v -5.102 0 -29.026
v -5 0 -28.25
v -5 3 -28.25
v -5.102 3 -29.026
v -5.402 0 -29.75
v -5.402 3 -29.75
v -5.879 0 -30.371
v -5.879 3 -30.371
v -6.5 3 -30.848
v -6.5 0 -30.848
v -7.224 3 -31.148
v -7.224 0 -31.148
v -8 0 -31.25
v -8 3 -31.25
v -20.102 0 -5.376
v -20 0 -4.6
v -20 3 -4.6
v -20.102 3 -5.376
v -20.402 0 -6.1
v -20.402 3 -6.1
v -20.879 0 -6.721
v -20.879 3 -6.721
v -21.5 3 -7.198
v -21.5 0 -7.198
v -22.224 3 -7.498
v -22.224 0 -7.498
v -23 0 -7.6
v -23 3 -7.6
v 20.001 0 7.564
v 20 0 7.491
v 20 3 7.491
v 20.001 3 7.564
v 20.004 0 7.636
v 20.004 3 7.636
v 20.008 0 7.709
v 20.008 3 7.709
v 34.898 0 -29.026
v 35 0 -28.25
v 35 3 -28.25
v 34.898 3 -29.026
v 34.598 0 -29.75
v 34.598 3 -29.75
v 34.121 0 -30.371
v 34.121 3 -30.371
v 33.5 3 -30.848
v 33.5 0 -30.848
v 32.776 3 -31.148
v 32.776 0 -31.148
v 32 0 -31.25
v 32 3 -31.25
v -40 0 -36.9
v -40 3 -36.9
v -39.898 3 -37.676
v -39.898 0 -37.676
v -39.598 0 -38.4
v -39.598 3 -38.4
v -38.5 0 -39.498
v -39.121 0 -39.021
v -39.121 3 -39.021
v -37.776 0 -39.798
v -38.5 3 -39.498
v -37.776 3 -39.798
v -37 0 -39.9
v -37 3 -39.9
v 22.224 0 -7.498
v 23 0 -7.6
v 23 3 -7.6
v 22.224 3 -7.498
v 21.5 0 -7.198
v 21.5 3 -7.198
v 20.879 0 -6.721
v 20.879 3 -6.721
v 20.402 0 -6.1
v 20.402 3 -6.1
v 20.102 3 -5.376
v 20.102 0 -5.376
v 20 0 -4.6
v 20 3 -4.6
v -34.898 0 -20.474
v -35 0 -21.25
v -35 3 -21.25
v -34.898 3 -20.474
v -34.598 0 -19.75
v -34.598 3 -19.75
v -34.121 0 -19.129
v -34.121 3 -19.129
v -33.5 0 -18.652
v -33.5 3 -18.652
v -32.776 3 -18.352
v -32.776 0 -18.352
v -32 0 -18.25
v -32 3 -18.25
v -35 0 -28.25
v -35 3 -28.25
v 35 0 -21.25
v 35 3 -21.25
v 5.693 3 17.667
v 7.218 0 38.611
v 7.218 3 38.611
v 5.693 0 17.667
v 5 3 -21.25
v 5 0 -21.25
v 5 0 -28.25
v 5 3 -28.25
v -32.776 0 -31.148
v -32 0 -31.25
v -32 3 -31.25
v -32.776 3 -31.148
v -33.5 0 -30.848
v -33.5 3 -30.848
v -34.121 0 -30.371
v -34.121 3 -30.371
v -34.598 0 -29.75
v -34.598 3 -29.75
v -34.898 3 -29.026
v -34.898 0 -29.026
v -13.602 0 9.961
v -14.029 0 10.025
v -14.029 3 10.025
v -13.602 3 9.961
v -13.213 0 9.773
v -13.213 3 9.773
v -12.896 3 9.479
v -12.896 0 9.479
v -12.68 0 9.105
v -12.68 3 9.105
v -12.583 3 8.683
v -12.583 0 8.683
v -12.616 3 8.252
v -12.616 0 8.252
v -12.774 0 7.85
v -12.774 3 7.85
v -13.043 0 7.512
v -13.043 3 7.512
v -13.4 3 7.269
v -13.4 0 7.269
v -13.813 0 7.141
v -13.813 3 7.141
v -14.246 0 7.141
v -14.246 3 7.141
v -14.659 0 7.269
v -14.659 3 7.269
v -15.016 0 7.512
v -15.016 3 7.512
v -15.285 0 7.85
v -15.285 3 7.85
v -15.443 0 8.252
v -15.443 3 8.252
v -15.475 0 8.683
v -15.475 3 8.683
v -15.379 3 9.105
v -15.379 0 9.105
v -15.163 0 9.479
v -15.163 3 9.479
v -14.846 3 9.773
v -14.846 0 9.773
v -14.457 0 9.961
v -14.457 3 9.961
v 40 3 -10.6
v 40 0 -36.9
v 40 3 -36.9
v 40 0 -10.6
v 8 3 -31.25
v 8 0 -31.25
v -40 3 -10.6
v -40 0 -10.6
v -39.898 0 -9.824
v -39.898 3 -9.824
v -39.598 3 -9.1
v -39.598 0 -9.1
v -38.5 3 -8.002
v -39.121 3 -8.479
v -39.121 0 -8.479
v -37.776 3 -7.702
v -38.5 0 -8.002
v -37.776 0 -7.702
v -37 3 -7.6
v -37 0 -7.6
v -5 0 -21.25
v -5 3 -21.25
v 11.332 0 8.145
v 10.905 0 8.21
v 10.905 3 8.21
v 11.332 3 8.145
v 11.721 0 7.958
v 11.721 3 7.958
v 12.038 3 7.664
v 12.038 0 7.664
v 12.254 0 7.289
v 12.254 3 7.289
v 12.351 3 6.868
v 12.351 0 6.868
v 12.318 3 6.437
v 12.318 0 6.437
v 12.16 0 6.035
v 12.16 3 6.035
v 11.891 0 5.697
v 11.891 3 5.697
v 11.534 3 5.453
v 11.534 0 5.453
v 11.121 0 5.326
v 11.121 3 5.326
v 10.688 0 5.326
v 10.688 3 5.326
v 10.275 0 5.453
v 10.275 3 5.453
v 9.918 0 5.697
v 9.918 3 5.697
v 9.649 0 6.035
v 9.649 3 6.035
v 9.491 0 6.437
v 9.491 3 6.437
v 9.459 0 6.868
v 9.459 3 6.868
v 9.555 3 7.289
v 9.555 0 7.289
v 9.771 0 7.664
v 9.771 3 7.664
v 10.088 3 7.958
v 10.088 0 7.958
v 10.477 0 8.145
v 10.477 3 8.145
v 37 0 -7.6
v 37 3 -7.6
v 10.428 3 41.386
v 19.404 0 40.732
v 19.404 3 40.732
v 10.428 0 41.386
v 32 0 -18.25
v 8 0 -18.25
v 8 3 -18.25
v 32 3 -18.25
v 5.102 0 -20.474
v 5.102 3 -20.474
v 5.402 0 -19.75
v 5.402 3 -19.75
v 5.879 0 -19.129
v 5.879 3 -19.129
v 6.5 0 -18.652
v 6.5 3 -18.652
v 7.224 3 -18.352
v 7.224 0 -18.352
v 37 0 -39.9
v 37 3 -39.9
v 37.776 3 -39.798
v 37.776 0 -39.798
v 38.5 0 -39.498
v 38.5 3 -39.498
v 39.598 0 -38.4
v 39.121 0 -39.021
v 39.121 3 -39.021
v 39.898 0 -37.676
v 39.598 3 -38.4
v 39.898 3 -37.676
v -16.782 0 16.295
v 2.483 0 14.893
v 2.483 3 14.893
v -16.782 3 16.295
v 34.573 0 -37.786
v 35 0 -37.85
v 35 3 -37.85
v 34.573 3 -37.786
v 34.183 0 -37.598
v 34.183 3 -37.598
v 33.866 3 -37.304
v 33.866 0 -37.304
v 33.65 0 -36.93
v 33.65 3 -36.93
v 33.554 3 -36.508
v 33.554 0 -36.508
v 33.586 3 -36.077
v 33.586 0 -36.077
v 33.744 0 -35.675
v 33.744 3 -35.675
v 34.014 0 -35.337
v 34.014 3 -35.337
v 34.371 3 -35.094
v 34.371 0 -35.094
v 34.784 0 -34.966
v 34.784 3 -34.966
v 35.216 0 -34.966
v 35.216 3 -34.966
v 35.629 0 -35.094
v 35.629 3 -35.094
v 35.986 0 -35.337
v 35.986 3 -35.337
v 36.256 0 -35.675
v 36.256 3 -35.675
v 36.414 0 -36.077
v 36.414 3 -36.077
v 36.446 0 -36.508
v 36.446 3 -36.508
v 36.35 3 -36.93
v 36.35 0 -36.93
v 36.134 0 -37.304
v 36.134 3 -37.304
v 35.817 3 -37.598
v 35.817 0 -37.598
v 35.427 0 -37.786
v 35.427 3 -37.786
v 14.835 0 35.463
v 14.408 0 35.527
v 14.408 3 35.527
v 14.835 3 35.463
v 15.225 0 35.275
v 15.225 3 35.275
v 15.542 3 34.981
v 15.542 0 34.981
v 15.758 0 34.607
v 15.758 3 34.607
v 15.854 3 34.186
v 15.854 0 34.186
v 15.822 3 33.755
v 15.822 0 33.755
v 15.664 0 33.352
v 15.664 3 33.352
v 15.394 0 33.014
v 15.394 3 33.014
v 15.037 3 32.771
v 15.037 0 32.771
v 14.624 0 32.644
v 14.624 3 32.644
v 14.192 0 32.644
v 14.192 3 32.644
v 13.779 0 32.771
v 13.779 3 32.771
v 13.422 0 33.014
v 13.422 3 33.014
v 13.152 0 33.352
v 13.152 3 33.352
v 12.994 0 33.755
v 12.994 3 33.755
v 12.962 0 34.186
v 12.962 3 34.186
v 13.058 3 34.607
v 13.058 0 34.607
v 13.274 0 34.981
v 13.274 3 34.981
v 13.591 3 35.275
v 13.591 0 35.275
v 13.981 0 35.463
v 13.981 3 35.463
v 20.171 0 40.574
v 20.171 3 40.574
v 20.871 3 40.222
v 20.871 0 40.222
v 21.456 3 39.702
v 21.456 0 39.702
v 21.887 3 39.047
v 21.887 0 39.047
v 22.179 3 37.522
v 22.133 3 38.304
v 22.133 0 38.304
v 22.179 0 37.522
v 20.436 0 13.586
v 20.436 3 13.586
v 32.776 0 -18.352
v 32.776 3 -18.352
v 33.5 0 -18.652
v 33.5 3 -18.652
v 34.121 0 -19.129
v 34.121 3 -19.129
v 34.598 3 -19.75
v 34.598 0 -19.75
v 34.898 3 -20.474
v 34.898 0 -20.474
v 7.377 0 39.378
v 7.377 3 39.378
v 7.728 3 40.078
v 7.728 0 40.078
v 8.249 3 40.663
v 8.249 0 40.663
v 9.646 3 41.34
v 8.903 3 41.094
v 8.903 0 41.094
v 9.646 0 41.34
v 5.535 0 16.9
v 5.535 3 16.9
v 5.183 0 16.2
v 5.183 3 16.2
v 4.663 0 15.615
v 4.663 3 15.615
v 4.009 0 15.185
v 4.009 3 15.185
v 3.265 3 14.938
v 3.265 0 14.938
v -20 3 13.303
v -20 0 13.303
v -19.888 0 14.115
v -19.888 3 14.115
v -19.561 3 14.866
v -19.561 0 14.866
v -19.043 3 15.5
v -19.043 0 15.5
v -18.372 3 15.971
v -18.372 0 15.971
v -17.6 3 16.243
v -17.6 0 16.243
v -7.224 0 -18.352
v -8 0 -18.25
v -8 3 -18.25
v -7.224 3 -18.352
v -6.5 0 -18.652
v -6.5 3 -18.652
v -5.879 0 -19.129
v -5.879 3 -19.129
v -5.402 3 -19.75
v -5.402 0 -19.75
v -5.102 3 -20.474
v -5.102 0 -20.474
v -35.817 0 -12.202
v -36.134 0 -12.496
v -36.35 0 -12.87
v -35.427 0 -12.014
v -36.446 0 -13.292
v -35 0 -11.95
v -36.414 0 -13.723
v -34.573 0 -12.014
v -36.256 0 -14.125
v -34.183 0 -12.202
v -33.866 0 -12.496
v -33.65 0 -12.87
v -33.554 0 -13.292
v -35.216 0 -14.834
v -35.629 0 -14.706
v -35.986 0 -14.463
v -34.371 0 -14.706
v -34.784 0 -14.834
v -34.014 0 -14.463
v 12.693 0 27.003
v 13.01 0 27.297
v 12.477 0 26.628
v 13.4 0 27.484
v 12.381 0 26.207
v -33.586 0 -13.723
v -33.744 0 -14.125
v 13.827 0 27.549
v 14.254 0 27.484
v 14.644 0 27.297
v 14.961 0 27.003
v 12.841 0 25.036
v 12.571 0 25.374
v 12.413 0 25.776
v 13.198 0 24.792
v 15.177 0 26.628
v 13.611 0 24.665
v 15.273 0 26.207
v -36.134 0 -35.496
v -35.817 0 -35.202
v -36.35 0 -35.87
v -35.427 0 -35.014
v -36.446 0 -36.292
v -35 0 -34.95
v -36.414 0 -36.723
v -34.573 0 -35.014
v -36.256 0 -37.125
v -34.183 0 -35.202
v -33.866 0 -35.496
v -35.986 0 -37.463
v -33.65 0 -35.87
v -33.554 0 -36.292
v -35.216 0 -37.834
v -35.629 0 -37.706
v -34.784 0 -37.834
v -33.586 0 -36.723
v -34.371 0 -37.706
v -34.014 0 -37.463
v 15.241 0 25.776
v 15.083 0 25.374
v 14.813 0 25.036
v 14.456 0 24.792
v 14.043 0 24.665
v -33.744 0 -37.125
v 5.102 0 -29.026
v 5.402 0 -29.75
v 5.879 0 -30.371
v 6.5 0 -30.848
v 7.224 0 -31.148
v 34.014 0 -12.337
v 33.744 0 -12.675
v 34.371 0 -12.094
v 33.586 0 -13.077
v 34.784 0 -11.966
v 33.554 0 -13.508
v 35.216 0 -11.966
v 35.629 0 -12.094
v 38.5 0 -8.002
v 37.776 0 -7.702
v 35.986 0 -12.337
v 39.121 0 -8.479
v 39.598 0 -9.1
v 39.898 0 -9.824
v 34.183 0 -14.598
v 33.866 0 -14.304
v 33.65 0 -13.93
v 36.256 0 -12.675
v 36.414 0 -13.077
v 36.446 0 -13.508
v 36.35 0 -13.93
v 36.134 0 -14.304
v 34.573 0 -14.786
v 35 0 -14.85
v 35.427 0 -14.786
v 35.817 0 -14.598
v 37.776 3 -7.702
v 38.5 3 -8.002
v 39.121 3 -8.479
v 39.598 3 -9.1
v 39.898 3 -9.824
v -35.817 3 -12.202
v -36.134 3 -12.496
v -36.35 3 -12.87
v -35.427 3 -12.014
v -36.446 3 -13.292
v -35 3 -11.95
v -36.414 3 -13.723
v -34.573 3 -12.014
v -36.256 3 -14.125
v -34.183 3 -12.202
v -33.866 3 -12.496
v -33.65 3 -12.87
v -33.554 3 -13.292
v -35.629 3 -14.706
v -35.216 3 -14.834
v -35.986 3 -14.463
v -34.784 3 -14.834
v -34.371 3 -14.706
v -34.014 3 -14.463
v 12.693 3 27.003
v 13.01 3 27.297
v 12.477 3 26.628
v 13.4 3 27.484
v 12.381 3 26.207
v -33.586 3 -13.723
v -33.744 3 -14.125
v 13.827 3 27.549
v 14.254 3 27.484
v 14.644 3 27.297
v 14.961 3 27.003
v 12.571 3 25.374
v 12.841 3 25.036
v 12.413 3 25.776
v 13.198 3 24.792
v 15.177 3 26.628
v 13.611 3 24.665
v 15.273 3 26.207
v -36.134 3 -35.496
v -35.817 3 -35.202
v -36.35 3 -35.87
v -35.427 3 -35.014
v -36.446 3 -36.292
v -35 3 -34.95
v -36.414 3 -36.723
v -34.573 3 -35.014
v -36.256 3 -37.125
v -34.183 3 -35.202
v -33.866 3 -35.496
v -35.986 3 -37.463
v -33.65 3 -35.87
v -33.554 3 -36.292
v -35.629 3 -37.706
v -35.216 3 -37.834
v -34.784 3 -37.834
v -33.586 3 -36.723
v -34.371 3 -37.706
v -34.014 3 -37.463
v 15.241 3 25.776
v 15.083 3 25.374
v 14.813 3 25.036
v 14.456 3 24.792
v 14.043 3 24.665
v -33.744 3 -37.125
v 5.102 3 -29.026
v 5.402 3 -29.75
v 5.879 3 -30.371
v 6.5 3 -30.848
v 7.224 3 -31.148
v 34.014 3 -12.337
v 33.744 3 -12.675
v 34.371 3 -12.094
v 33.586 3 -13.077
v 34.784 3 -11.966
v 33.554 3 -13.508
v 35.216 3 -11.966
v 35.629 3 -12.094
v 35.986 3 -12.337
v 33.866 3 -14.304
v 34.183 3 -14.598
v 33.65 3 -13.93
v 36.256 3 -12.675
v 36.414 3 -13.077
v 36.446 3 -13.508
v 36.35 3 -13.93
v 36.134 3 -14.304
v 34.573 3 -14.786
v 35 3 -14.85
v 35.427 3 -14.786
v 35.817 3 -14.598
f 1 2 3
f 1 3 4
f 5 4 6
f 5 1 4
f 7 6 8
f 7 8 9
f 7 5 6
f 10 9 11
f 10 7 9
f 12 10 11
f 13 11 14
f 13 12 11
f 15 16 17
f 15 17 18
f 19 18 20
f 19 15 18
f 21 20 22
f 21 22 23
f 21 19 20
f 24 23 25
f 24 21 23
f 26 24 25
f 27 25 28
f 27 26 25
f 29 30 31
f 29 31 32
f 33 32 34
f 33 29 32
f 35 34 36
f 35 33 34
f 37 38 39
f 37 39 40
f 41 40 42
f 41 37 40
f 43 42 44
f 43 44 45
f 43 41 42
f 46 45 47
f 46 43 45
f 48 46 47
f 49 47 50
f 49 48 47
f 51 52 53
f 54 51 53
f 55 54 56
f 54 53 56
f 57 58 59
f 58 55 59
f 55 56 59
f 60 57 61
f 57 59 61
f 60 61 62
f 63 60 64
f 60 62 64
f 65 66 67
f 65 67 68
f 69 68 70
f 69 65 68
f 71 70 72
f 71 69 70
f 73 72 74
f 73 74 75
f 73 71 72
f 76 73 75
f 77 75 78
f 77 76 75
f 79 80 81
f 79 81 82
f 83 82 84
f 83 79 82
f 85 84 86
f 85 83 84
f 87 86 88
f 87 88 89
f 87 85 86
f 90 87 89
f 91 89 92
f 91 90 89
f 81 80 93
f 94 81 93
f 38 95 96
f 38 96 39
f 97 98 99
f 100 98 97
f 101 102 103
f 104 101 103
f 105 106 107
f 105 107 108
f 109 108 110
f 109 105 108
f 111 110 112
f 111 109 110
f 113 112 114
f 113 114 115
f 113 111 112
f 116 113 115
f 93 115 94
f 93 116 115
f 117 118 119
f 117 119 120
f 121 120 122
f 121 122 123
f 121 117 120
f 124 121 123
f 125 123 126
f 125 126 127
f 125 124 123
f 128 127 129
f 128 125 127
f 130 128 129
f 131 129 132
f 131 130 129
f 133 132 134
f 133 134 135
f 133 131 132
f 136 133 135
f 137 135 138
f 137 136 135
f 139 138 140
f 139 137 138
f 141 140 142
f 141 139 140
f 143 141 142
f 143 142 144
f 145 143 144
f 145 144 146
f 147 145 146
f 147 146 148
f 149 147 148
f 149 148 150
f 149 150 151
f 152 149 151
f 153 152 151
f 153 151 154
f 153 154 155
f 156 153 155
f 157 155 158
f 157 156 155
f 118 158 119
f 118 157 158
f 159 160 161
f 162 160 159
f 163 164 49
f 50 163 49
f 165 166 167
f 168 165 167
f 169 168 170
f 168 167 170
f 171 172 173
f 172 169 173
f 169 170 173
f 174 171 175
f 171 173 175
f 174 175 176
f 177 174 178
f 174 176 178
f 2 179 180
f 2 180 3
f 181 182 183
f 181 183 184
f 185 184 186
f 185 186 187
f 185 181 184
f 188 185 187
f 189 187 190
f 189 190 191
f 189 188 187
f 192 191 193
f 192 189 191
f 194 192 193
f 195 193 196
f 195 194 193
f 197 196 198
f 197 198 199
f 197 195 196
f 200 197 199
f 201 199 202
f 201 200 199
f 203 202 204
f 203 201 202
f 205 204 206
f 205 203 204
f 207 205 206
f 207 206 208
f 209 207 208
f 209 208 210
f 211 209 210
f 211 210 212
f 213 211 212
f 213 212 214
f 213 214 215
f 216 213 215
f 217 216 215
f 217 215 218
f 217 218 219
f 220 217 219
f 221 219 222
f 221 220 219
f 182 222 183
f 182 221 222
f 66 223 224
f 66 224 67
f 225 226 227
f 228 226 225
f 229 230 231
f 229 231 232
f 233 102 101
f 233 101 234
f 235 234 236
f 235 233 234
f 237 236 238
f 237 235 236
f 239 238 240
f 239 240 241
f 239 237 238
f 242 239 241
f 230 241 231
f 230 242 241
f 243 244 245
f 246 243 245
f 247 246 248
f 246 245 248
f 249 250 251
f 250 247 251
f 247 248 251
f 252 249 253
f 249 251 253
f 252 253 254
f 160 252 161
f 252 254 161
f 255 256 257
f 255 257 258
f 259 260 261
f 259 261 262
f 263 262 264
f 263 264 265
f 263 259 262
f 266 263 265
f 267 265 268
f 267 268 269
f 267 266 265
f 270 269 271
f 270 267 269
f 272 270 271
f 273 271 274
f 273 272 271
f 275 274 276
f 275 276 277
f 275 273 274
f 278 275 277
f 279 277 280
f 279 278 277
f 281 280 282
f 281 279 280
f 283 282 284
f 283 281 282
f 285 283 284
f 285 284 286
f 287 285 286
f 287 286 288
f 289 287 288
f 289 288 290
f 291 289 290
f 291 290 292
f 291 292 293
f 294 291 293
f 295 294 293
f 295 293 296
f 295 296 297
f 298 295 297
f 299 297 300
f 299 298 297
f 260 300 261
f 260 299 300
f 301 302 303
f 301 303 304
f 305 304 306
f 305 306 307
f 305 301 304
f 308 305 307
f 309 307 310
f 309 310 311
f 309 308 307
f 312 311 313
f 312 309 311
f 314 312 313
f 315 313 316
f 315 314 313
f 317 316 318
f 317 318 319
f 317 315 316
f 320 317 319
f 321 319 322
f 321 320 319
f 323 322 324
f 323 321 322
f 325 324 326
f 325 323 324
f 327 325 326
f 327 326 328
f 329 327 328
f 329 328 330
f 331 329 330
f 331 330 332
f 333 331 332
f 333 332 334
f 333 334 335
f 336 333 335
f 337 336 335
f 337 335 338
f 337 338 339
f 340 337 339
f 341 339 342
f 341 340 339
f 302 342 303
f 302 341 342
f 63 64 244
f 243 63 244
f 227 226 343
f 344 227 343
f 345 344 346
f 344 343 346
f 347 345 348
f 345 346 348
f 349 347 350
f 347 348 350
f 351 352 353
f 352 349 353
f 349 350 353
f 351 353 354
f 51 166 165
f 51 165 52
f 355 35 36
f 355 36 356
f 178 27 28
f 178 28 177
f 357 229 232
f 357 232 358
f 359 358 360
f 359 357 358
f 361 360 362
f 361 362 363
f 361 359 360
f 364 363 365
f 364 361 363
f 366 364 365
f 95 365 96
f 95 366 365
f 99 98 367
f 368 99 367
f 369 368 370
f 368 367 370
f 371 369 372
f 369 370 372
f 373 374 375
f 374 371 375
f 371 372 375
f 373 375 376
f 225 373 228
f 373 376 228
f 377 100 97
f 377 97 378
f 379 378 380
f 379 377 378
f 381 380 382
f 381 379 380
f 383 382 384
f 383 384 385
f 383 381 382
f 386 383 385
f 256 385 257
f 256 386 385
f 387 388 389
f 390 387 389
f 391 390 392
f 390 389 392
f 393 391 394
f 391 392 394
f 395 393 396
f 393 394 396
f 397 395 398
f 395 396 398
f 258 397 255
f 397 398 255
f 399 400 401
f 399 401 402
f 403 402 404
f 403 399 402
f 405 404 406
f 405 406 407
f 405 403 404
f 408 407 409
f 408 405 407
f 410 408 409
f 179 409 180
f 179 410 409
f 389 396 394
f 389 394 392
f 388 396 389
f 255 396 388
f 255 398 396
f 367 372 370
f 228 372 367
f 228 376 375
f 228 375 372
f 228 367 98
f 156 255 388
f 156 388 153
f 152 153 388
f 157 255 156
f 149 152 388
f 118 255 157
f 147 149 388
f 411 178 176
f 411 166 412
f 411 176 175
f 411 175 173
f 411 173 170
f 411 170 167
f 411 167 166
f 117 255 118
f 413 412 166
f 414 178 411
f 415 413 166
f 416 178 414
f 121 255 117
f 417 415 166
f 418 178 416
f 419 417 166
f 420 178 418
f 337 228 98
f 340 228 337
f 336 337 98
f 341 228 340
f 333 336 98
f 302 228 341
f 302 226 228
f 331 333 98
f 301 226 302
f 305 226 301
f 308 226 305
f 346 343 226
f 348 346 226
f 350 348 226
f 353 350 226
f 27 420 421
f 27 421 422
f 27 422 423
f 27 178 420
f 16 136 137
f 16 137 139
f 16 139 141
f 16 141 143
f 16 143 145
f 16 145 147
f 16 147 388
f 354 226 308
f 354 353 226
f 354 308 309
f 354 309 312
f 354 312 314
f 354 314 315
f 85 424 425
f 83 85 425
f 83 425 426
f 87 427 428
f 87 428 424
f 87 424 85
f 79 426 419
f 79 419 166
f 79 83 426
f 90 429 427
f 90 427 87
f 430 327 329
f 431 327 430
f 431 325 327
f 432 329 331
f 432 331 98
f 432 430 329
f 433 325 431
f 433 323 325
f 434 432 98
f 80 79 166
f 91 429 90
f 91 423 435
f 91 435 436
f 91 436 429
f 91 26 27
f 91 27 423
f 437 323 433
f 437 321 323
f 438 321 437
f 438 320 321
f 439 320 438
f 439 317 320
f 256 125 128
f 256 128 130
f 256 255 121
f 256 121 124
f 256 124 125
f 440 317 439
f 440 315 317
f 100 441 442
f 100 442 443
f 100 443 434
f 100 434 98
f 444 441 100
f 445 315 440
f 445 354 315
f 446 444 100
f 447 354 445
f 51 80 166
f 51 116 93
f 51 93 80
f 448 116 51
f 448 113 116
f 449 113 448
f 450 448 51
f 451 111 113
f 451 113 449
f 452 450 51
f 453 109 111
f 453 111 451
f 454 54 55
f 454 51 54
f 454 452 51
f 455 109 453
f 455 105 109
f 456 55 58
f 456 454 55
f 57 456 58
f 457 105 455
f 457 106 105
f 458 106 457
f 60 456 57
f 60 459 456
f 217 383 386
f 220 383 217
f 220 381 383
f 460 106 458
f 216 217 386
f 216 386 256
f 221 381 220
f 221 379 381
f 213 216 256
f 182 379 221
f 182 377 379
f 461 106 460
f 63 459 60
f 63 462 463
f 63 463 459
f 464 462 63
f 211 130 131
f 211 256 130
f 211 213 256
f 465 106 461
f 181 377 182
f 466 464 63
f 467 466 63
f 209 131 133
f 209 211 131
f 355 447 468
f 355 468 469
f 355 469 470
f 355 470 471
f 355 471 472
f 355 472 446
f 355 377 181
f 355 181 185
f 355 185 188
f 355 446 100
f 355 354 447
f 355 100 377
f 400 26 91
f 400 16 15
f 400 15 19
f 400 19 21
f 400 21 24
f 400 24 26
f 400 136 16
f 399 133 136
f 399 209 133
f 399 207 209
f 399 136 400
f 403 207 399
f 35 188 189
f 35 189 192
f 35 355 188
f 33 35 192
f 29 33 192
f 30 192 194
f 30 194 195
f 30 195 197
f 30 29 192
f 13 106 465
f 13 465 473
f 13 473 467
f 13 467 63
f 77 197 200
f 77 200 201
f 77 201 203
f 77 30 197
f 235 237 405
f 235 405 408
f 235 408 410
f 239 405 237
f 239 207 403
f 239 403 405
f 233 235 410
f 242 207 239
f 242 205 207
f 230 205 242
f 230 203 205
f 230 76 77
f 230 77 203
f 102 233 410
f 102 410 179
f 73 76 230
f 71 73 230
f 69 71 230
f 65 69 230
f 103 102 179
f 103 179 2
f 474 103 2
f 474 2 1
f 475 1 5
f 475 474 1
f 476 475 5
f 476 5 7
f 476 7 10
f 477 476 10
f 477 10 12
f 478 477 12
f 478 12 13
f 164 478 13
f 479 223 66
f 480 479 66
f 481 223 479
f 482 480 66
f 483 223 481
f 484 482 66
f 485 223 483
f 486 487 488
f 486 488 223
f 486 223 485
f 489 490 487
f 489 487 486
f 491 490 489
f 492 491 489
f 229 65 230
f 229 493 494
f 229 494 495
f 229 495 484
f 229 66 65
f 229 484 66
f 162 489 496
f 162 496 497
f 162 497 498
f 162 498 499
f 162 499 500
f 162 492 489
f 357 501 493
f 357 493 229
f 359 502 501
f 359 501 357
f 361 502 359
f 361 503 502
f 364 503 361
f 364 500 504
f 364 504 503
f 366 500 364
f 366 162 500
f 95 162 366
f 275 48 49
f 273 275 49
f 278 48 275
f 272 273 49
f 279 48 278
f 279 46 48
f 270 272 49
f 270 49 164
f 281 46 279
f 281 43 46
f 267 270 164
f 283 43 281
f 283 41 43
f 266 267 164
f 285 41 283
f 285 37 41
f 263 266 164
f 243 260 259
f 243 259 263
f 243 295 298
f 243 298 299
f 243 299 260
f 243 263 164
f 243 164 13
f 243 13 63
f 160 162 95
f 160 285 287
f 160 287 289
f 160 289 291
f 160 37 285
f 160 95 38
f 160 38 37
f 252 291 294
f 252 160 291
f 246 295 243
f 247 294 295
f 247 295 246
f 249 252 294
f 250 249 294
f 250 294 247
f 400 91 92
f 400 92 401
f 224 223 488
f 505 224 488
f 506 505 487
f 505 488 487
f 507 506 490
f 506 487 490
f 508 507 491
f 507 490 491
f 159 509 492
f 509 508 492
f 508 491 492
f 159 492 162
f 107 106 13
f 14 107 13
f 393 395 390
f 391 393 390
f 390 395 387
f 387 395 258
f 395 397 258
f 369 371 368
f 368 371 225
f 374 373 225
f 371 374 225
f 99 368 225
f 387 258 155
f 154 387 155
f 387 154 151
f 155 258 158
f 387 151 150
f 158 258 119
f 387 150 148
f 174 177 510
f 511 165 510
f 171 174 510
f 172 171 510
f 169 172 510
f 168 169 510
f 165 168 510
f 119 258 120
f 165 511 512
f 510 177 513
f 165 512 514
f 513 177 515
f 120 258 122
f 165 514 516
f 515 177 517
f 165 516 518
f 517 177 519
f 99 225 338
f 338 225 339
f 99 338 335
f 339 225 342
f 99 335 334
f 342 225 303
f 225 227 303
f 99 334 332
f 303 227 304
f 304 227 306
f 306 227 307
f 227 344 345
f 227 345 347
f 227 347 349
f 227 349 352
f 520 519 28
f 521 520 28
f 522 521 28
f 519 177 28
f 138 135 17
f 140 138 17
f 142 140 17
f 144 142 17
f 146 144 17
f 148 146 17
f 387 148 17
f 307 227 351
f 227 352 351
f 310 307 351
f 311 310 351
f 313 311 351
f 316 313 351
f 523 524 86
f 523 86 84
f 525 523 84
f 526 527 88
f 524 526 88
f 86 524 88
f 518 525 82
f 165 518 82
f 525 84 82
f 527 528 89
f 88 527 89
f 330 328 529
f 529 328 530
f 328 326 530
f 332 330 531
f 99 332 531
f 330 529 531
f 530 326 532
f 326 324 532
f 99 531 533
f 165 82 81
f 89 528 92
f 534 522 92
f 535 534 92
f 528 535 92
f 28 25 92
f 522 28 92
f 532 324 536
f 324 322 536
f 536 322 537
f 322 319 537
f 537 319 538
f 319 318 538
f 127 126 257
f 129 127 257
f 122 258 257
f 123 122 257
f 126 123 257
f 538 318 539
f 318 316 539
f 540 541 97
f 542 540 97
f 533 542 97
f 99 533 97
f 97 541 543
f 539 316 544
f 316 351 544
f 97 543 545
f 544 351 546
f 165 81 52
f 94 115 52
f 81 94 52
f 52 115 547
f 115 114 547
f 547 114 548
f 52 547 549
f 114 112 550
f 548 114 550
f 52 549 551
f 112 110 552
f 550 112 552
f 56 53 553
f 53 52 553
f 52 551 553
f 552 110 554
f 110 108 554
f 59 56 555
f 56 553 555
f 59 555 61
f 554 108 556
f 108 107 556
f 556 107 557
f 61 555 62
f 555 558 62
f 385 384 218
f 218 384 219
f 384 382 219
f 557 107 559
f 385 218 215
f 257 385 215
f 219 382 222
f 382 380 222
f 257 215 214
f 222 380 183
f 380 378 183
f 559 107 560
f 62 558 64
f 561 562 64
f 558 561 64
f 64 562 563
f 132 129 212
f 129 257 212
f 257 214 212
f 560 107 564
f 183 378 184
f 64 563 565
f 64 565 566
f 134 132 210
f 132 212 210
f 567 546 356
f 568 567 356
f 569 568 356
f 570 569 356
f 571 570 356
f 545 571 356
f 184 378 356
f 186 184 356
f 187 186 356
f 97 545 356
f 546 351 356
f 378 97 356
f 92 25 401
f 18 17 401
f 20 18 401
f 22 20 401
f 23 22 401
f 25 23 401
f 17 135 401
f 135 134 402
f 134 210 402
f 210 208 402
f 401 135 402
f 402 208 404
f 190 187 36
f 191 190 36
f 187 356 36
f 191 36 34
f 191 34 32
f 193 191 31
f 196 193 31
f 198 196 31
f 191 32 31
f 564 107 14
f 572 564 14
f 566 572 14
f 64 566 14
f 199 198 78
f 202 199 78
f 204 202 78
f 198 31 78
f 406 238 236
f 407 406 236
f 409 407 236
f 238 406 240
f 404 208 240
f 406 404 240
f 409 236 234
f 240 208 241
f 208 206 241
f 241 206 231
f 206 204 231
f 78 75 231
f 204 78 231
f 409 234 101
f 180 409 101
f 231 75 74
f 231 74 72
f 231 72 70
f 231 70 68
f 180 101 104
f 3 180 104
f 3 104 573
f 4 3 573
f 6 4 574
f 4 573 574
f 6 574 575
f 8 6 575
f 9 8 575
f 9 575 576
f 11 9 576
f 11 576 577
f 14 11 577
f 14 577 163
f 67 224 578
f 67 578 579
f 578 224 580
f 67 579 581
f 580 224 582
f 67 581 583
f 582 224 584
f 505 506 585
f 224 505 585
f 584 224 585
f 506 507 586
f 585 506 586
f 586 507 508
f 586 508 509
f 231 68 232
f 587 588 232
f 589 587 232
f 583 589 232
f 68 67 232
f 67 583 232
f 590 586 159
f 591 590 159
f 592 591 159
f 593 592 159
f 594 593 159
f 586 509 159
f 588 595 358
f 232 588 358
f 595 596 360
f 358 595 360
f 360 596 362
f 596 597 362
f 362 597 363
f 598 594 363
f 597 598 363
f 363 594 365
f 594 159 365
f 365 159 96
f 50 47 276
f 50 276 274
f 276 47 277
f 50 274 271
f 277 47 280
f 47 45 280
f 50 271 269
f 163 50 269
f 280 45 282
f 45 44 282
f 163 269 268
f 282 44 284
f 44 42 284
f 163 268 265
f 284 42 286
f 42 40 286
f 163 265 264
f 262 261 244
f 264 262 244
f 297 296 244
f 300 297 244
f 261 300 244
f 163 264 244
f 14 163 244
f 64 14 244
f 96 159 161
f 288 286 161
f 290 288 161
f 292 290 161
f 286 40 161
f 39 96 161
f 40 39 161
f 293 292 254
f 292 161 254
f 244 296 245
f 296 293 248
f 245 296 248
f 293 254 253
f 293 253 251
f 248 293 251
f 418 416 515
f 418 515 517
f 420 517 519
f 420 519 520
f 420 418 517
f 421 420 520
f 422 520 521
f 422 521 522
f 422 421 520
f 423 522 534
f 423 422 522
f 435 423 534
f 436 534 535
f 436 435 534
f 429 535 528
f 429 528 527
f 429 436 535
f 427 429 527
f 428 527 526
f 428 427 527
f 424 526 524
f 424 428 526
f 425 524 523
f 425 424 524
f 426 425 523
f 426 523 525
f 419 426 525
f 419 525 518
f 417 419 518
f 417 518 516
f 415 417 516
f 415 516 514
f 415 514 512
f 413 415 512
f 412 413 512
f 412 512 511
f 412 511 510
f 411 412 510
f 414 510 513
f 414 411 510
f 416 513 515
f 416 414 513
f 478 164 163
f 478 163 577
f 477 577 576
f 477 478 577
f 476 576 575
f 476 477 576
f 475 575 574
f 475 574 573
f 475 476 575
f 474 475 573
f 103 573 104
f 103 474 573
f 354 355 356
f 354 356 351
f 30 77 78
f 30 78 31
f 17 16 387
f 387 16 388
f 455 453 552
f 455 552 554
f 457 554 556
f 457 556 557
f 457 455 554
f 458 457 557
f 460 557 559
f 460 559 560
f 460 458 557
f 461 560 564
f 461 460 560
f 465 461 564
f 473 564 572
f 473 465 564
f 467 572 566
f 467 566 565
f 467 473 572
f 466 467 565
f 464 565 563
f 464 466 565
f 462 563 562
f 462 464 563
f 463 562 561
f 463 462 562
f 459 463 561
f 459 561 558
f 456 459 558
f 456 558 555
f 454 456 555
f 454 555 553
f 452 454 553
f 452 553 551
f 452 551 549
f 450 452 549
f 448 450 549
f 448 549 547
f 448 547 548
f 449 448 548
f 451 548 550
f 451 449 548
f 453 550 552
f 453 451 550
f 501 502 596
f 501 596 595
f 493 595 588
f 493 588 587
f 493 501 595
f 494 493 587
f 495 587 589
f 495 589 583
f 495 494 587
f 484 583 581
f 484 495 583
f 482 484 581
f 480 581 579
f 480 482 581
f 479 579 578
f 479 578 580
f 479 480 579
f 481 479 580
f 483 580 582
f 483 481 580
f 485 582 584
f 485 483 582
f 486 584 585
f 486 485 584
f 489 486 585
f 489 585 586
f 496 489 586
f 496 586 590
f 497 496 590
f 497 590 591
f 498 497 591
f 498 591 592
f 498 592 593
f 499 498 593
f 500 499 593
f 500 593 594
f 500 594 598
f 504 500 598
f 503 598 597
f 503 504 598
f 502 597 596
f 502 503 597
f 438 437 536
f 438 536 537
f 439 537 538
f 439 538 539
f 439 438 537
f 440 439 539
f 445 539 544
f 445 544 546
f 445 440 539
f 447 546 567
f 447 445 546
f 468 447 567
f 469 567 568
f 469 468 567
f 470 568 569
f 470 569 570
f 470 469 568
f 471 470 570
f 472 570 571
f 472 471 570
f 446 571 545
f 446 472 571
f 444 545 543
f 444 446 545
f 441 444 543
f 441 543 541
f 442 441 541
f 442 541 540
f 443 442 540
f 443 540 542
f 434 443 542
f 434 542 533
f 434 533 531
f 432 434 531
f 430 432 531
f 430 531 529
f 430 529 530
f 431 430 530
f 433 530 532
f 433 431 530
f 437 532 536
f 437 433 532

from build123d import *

# Parameters (mm, degrees)
SKETCH_1_R          = 1.45
SKETCH_1_W          = 30
SKETCH_1_H          = 13
EXTRUDE_1_DEPTH     = 3
SKETCH_2_W          = 80
SKETCH_2_H          = 2
CUT_EXTRUDE_1_DEPTH = 59.005258382
FILLET_1_R          = 3


with BuildPart() as part:
    # 草图1 → 凸台-拉伸1 (new body)
    with BuildSketch(Plane(origin=(0, 0, 0), x_dir=(1, 0, 0), z_dir=(0, 1, 0))):
        Polygon((-20, -7.6), (-20, 7.6), (-40, 7.6), (-40, 41.9), (40, 41.9), (40, 7.6), (20, 7.6), (20, -7.6), (20.435801373, -13.585557258), (22.396449617, -40.514275357), (7.436050673, -41.603524381), (5.475402429, -14.674806282), (-20, -16.529640324), align=None)
        with Locations(Location((-35, 13.4, 0), (0, 0, 270))):
            Circle(SKETCH_1_R, mode=Mode.SUBTRACT)
        with Locations(Location((-35, 36.4, 0), (0, 0, 270))):
            Circle(SKETCH_1_R, mode=Mode.SUBTRACT)
        with Locations(Location((35, 13.4, 0), (0, 0, 90))):
            Circle(SKETCH_1_R, mode=Mode.SUBTRACT)
        with Locations(Location((35, 36.4, 0), (0, 0, 90))):
            Circle(SKETCH_1_R, mode=Mode.SUBTRACT)
        with Locations(Location((-14.029429392, -8.57507717, 0), (0, 0, 270))):
            Circle(SKETCH_1_R, mode=Mode.SUBTRACT)
        with Locations(Location((10.904568848, -6.759662129, 0), (0, 0, 270))):
            Circle(SKETCH_1_R, mode=Mode.SUBTRACT)
        with Locations(Location((13.827001121, -26.098500925, 0), (0, 0, 270))):
            Circle(SKETCH_1_R, mode=Mode.SUBTRACT)
        with Locations(Location((14.407933934, -34.077380362, 0), (0, 0, 270))):
            Circle(SKETCH_1_R, mode=Mode.SUBTRACT)
        with Locations((-20, 24.75)):
            Rectangle(SKETCH_1_W, SKETCH_1_H, mode=Mode.SUBTRACT)
        with Locations((20, 24.75)):
            Rectangle(SKETCH_1_W, SKETCH_1_H, mode=Mode.SUBTRACT)
    extrude(amount=EXTRUDE_1_DEPTH)

    # 草图2 → 切除-拉伸1 (cut, through all)
    with BuildSketch(Plane(origin=(0, 3, 0), x_dir=(1, 0, 0), z_dir=(0, 1, 0))):
        with Locations((0, 40.9)):
            Rectangle(SKETCH_2_W, SKETCH_2_H)
    extrude(amount=-CUT_EXTRUDE_1_DEPTH, mode=Mode.SUBTRACT)

    # 圆角1
    # the kernel refuses this fillet: 3 mm, written as the material it adds along each edge
    with BuildSketch(Plane(origin=(20, 0, -7.6), x_dir=(0, 0, 1), z_dir=(0, 1, 0)), Plane(origin=(5.475402429, 0, 14.674806282), x_dir=(-0.9973599295981227, 0, 0.07261660162819321), z_dir=(0, 1, 0)), Plane(origin=(-35, 0, -31.25), x_dir=(0, 0, 1), z_dir=(0, 1, 0)), Plane(origin=(-35, 0, -18.25), x_dir=(1, 0, 0), z_dir=(0, 1, 0)), Plane(origin=(5, 0, -18.25), x_dir=(1, 0, 0), z_dir=(0, 1, 0)), Plane(origin=(5, 0, -31.25), x_dir=(0, 0, 1), z_dir=(0, 1, 0))) as fillet_1_piece_1:
        with BuildLine():
            CenterArc((FILLET_1_R, FILLET_1_R), FILLET_1_R, 180, 90)
            Line((0, FILLET_1_R), (0, 0))
            Line((0, 0), (FILLET_1_R, 0))
        make_face()
    extrude(amount=3)
    with BuildSketch(Plane(origin=(20, 0, 7.6), x_dir=(0.07261660162820198, 0, 0.9973599295981221), z_dir=(0, 1, 0))) as fillet_1_piece_2:
        with BuildLine():
            CenterArc((FILLET_1_R * 0.0363562923998, FILLET_1_R), FILLET_1_R, 265.835709886, 4.164290114)
            Line((-FILLET_1_R * 0.0362603092284, FILLET_1_R * 0.00264007040188), (0, 0))
            Line((0, 0), (FILLET_1_R * 0.0363562923998, 0))
        make_face()
    extrude(amount=3)
    with BuildSketch(Plane(origin=(-20, 0, -7.6), x_dir=(0, 0, 1), z_dir=(0, 1, 0)), Plane(origin=(-5, 0, -18.25), x_dir=(-1, 0, 0), z_dir=(0, 1, 0)), Plane(origin=(-5, 0, -31.25), x_dir=(0, 0, 1), z_dir=(0, 1, 0)), Plane(origin=(35, 0, -18.25), x_dir=(-1, 0, 0), z_dir=(0, 1, 0)), Plane(origin=(35, 0, -31.25), x_dir=(0, 0, 1), z_dir=(0, 1, 0))) as fillet_1_piece_3:
        with BuildLine():
            CenterArc((FILLET_1_R, -FILLET_1_R), FILLET_1_R, 90, 90)
            Line((0, -FILLET_1_R), (0, 0))
            Line((0, 0), (FILLET_1_R, 0))
        make_face()
    extrude(amount=3)
    # the kernel refuses this fillet: 3 mm, written as the material it takes off along each edge
    with BuildSketch(Plane(origin=(-40, 10.5, -39.9), x_dir=(1, 0, 0), z_dir=(0, -1, 0)), Plane(origin=(40, 10.5, -39.9), x_dir=(0, 0, 1), z_dir=(0, -1, 0)), Plane(origin=(-40, -7.5, -7.6), x_dir=(1, 0, 0), z_dir=(0, 1, 0))) as fillet_1_2_piece_1:
        with BuildLine():
            CenterArc((FILLET_1_R, FILLET_1_R), FILLET_1_R, 180, 90)
            Line((0, FILLET_1_R), (0, 0))
            Line((0, 0), (FILLET_1_R, 0))
        make_face()
    extrude(amount=18, mode=Mode.SUBTRACT)
    with BuildSketch(Plane(origin=(22.396449617, -7.5, 40.514275357), x_dir=(-0.9973599295981227, 0, 0.07261660162819322), z_dir=(0, 1, 0)), Plane(origin=(7.436050673, -7.5, 41.603524381), x_dir=(-0.07261660162819356, 0, -0.9973599295981227), z_dir=(0, 1, 0)), Plane(origin=(40, -7.5, -7.6), x_dir=(-1, 0, 0), z_dir=(0, 1, 0))) as fillet_1_2_piece_2:
        with BuildLine():
            CenterArc((FILLET_1_R, -FILLET_1_R), FILLET_1_R, 90, 90)
            Line((0, -FILLET_1_R), (0, 0))
            Line((0, 0), (FILLET_1_R, 0))
        make_face()
    extrude(amount=18, mode=Mode.SUBTRACT)
    with BuildSketch(Plane(origin=(-20, -8.065919107, 16.529640324), x_dir=(0, 0, -1), z_dir=(0, 1, 0))) as fillet_1_2_piece_3:
        with BuildLine():
            CenterArc((FILLET_1_R * 1.07545588087, -FILLET_1_R), FILLET_1_R, 90, 94.164290114)
            Line((FILLET_1_R * 0.0780959512697, -FILLET_1_R * 1.07261660163), (0, 0))
            Line((0, 0), (FILLET_1_R * 1.07545588087, 0))
        make_face()
    extrude(amount=19.131838213, mode=Mode.SUBTRACT)


solid = part.part
